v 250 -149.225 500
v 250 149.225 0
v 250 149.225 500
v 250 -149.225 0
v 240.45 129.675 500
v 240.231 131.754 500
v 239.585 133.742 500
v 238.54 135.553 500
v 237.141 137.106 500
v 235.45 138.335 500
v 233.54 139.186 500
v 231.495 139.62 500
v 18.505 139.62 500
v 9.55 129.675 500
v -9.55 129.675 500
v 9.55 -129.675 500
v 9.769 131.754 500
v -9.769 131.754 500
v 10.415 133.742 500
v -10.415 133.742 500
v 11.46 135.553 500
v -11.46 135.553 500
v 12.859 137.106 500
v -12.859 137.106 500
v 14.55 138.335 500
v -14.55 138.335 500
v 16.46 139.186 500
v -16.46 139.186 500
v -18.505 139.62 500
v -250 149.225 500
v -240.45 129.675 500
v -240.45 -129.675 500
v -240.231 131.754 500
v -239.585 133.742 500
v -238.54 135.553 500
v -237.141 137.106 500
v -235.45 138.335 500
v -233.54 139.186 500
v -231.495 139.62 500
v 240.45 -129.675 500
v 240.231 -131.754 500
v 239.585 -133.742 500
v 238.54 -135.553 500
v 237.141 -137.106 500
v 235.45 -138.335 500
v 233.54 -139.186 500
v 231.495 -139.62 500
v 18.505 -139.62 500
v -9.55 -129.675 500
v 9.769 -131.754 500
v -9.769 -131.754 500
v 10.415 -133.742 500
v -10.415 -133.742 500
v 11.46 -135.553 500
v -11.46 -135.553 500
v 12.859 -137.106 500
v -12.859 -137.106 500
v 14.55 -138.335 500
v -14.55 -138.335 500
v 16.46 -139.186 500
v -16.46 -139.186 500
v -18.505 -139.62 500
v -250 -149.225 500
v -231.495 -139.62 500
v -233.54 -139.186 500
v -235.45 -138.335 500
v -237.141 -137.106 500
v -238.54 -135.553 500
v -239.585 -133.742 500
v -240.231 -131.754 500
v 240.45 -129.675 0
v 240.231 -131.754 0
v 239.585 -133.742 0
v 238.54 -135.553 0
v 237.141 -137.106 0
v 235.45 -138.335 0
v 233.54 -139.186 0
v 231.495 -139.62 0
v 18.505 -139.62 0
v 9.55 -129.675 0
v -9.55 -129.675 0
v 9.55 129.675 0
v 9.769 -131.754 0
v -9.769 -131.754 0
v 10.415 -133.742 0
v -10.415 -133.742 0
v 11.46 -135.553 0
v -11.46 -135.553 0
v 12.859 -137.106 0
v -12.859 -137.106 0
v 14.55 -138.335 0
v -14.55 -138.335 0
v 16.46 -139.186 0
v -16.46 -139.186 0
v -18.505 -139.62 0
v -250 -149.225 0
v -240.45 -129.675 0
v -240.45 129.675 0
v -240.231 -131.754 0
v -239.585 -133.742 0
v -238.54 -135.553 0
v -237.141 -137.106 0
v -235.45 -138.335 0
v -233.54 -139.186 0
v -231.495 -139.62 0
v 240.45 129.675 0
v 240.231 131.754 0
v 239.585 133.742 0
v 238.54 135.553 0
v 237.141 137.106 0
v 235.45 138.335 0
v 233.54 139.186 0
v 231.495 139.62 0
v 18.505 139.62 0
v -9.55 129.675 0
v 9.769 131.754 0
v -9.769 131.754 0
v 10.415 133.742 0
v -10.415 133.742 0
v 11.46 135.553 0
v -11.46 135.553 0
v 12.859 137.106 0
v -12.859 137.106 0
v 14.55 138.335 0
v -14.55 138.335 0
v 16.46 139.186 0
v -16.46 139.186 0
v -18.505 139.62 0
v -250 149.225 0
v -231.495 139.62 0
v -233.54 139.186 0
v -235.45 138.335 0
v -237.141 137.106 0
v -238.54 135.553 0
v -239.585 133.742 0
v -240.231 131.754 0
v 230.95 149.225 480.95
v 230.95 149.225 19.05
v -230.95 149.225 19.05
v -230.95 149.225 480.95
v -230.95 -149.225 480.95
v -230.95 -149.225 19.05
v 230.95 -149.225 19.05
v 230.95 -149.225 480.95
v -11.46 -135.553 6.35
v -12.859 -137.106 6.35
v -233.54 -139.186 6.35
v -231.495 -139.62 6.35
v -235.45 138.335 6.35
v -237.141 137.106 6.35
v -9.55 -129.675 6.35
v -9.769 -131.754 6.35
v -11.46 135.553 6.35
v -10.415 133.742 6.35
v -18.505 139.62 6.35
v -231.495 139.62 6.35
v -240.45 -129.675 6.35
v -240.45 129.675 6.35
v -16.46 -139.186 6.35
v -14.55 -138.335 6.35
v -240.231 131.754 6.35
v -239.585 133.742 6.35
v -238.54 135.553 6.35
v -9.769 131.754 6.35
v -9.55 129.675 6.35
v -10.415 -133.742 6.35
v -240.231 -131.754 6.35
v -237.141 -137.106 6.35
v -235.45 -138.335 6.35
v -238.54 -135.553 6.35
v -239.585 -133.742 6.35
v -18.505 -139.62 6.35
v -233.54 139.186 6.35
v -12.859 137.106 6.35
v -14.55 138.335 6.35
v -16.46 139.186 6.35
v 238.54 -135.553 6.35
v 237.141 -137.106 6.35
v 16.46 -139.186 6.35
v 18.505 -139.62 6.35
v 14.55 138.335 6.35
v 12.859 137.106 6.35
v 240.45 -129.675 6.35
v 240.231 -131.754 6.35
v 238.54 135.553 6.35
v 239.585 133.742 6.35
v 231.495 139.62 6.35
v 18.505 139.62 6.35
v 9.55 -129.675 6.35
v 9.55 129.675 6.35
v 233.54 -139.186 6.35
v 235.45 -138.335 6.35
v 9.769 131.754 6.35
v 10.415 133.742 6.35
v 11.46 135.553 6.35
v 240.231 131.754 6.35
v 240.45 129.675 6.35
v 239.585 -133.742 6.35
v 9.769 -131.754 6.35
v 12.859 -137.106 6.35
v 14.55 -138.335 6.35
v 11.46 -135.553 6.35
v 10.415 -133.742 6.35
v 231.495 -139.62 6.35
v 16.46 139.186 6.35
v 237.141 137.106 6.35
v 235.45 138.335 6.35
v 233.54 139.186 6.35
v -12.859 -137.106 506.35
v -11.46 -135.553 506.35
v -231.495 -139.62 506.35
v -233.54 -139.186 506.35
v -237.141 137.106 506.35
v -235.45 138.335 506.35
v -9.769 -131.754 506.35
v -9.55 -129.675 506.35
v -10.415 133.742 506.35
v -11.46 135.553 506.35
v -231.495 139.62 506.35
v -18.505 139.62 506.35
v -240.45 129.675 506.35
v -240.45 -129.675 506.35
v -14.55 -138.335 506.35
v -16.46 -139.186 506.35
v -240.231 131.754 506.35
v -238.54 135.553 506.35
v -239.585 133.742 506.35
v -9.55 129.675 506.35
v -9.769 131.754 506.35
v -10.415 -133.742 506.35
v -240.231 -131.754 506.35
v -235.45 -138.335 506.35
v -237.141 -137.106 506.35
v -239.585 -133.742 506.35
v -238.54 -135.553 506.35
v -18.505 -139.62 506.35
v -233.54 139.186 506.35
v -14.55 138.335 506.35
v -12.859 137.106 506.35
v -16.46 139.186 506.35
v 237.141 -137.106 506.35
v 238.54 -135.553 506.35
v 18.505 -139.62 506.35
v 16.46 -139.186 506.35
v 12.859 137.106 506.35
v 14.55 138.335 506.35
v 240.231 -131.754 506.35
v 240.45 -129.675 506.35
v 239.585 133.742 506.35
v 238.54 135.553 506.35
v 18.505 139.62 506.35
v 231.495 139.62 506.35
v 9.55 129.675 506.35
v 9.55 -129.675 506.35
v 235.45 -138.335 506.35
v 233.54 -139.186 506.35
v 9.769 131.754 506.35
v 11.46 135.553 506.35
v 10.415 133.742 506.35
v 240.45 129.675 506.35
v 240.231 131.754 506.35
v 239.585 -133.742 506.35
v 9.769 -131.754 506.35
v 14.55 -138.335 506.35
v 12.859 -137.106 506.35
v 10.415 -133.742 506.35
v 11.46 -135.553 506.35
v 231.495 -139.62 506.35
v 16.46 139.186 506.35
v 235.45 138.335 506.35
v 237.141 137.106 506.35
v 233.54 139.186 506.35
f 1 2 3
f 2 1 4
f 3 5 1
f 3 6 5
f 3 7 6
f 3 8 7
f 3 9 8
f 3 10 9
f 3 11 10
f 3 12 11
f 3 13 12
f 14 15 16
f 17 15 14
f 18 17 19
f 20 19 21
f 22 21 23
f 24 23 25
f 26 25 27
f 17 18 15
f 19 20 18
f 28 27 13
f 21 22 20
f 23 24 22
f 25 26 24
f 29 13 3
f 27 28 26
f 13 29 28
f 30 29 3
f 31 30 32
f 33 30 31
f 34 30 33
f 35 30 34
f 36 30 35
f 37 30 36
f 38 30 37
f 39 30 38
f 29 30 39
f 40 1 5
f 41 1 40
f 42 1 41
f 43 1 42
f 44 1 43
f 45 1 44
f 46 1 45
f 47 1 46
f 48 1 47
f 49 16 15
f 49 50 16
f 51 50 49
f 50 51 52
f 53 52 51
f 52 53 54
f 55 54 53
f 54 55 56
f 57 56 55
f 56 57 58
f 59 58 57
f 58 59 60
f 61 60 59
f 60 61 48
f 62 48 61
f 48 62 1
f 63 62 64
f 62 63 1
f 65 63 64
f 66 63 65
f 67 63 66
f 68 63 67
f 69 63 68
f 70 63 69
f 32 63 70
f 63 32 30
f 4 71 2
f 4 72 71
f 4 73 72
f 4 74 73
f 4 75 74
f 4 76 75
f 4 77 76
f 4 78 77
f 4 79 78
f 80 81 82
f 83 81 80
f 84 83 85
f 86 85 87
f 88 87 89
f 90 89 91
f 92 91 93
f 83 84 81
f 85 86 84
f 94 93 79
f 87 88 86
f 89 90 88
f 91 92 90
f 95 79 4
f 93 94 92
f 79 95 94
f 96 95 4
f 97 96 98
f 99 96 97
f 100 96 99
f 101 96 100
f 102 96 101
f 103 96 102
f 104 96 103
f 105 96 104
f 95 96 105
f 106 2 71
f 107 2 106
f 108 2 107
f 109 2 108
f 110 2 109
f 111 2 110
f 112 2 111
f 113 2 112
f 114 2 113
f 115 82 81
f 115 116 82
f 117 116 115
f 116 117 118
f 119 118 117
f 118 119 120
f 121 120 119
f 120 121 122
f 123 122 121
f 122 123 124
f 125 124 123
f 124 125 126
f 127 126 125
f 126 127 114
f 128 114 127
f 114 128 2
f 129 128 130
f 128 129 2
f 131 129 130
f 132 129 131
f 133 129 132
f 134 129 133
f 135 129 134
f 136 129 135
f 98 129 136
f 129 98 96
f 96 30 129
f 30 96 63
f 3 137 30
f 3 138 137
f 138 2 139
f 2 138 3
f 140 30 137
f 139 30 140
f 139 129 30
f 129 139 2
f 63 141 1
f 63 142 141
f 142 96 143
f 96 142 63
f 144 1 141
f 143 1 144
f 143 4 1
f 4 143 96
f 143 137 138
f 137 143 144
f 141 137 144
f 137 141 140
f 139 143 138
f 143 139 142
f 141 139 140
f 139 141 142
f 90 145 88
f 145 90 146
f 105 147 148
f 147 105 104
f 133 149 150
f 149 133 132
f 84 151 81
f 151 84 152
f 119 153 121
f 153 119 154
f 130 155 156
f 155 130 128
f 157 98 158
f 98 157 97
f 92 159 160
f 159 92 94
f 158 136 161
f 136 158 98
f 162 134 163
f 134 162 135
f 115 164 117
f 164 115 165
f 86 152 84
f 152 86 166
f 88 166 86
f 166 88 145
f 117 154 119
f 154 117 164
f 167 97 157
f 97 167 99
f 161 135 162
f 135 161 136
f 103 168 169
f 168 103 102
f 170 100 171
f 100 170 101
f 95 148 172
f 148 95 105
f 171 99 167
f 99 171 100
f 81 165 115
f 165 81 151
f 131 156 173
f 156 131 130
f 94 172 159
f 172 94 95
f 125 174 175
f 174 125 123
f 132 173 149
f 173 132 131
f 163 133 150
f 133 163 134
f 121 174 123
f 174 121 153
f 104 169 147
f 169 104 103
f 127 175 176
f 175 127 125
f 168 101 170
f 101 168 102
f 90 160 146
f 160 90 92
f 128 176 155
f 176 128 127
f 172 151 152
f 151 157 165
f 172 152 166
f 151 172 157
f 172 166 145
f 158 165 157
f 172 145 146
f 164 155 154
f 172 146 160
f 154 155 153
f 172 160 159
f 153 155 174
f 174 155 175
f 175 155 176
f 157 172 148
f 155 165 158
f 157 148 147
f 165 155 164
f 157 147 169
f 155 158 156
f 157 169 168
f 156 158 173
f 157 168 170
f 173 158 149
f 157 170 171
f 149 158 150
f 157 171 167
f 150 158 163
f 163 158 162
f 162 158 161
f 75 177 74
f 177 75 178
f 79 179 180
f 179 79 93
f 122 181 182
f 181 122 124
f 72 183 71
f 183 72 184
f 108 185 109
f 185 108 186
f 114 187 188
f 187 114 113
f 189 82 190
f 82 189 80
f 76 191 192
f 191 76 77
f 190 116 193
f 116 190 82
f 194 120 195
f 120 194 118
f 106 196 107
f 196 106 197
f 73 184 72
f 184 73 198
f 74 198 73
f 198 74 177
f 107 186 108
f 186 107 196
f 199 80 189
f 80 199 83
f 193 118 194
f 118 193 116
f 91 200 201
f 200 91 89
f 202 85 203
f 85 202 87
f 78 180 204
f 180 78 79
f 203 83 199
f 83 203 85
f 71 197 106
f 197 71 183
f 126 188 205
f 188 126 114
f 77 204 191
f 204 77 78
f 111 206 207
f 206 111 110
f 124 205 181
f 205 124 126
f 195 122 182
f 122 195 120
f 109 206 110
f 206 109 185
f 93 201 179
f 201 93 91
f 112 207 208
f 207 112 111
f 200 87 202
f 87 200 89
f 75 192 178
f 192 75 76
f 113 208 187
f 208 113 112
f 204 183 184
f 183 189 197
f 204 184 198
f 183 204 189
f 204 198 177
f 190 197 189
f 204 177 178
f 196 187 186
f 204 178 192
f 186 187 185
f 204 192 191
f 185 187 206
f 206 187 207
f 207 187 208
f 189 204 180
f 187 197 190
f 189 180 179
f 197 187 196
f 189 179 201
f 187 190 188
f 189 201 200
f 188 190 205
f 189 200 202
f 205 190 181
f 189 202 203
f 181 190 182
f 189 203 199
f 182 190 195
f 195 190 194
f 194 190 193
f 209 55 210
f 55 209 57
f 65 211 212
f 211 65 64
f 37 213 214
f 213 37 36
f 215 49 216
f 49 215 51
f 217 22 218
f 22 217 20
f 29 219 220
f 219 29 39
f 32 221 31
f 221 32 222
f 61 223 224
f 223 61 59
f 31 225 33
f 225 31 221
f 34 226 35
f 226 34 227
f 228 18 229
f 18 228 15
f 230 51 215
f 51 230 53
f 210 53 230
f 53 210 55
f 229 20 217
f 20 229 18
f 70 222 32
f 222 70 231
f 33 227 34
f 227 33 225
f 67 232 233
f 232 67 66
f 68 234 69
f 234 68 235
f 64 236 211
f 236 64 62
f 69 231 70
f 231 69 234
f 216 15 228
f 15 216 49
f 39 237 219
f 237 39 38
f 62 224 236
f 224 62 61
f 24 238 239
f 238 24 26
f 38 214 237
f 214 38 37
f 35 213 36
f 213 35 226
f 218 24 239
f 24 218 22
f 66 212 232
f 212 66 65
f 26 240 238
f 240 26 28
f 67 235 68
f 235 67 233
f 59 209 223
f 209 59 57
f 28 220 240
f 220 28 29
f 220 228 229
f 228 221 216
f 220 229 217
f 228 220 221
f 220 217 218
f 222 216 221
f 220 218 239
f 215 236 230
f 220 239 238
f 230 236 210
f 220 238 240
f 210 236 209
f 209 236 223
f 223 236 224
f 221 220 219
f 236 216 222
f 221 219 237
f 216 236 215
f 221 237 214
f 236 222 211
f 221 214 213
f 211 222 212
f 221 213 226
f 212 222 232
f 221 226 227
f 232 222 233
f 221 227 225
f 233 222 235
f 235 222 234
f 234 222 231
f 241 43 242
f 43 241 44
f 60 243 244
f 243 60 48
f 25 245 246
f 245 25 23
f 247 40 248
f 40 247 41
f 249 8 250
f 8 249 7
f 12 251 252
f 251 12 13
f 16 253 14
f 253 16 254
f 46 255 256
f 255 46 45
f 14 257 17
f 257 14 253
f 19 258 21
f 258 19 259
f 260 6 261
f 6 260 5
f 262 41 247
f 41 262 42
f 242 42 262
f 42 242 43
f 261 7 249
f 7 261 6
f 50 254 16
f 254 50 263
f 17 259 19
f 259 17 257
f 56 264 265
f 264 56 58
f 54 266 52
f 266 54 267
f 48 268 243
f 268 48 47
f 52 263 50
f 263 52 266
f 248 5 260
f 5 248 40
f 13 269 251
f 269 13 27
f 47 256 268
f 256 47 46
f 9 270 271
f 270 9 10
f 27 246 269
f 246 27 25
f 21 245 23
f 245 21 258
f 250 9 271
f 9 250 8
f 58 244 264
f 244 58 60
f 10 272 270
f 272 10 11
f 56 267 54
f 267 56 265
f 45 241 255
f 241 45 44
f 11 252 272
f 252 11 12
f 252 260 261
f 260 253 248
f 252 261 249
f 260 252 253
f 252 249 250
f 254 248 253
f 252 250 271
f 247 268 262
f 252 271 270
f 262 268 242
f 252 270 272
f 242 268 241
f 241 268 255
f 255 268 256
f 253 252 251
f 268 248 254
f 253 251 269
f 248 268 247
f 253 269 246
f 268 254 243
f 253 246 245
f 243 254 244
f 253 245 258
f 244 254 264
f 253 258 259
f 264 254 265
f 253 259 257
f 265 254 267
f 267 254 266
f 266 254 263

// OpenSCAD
MODULE_SIZE = 500; //mm, half a meter
MODULE_DEPTH = inchesToMillimetes(inches = 12-0.25);

function inchesToMillimetes(inches) = 25.4*inches;

module shelf(width, height) {
    difference() {
        _width  = width*MODULE_SIZE;
        _height = height*MODULE_SIZE;
        translate([0,0,_height/2]) {
            cube([_width,MODULE_DEPTH,_height],center = true);
        }

        _thickness = inchesToMillimetes(inches = 0.75);
        _height_2 = _height - 2*_thickness;
        _width_2  = _width  - 2*_thickness;
        translate([0,0,_height_2/2+_thickness]) {
            cube(
                [_width_2, MODULE_DEPTH, _height_2],
                center = true
            );
        }
    }
}

module peg(width, height, inset, radius) {
    for(_width = [0:0.5:width-0.5] ) {
        translate([MODULE_SIZE*_width,0,0]) {
            _dx = (width-0.5)*MODULE_SIZE/2;
            hull() {
                for(x_side = [-1, 1]) {
                    for(z_side = [-1, 1]) {
                        translate(
                            [
                                ( MODULE_SIZE/4  - inset )  *  x_side - _dx,
                                ( MODULE_DEPTH/2 - inset )  *  z_side,
                                height/2
                            ]
                        ) {
                            cylinder(h = height, r = radius, center = true);
                        }
                    }
                }
            }
        }
    }
}

module shelf_module(width = 1, height = 1) {
    board_thickness = inchesToMillimetes(0.75);
    insert_height = inchesToMillimetes(0.25);
    difference() {
        union() {
            shelf(width = width, height = height);
            translate([0,0,MODULE_SIZE*height]) {
                peg(width = width, height = insert_height, inset = board_thickness+0.5, radius = 10);
            }
        }
        peg(width = width, height = insert_height, inset = board_thickness+0.5, radius = 10);
    }
};

module shelves() {
    translate([0,0,0]) {
        shelf_module(width = 1, height = 1);
    }
    translate([3/2*MODULE_SIZE,0,0]) {
        shelf_module(width = 2, height = 1);
    }
    translate([-3/2*MODULE_SIZE,0,0]) {
        shelf_module(width = 2, height = 1);
    }
    
    translate([-7/4*MODULE_SIZE,0,MODULE_SIZE]) {
        shelf_module(width = 0.5, height = 1);
    }
    translate([-9/4*MODULE_SIZE,0,MODULE_SIZE]) {
        shelf_module(width = 0.5, height = 1);
    }
    translate([-1/2*MODULE_SIZE,0,MODULE_SIZE]) {
        shelf_module(width = 2, height = 1);
    }
    translate([MODULE_SIZE,0,MODULE_SIZE]) {
        shelf_module(width = 1, height = 1);
    }
    translate([2*MODULE_SIZE,0,MODULE_SIZE]) {
        shelf_module(width = 1, height = 0.5);
    }
    translate([2*MODULE_SIZE,0,3/2*MODULE_SIZE]) {
        shelf_module(width = 1, height = 0.5);
    }
    
    translate([2*MODULE_SIZE,0,2*MODULE_SIZE]) {
        shelf_module(width = 1, height = 1);
    }
    translate([1/2*MODULE_SIZE,0,2*MODULE_SIZE]) {
        shelf_module(width = 2, height = 1);
    }
    translate([-3/2*MODULE_SIZE,0,2*MODULE_SIZE]) {
        shelf_module(width = 2, height = 1);
    }
    
    translate([-2*MODULE_SIZE,0,3*MODULE_SIZE]) {
        shelf_module(width = 1, height = 1);
    }
    translate([-1/2*MODULE_SIZE,0,3*MODULE_SIZE]) {
        shelf_module(width = 2, height = 1);
    }
    translate([3/2*MODULE_SIZE,0,3*MODULE_SIZE]) {
        shelf_module(width = 2, height = 1);
    }
    
    translate([-7/4*MODULE_SIZE,0,4*MODULE_SIZE]) {
        shelf_module(width = 0.5, height = 1);
    }
    translate([-9/4*MODULE_SIZE,0,4*MODULE_SIZE]) {
        shelf_module(width = 0.5, height = 1);
    }
    translate([-1*MODULE_SIZE,0,4*MODULE_SIZE]) {
        shelf_module(width = 1, height = 1);
    }
    translate([1/2*MODULE_SIZE,0,4*MODULE_SIZE]) {
        shelf_module(width = 2, height = 1);
    }
    translate([2*MODULE_SIZE,0,4*MODULE_SIZE]) {
        shelf_module(width = 1, height = 1);
    }
}

//shelves();
shelf_module();
